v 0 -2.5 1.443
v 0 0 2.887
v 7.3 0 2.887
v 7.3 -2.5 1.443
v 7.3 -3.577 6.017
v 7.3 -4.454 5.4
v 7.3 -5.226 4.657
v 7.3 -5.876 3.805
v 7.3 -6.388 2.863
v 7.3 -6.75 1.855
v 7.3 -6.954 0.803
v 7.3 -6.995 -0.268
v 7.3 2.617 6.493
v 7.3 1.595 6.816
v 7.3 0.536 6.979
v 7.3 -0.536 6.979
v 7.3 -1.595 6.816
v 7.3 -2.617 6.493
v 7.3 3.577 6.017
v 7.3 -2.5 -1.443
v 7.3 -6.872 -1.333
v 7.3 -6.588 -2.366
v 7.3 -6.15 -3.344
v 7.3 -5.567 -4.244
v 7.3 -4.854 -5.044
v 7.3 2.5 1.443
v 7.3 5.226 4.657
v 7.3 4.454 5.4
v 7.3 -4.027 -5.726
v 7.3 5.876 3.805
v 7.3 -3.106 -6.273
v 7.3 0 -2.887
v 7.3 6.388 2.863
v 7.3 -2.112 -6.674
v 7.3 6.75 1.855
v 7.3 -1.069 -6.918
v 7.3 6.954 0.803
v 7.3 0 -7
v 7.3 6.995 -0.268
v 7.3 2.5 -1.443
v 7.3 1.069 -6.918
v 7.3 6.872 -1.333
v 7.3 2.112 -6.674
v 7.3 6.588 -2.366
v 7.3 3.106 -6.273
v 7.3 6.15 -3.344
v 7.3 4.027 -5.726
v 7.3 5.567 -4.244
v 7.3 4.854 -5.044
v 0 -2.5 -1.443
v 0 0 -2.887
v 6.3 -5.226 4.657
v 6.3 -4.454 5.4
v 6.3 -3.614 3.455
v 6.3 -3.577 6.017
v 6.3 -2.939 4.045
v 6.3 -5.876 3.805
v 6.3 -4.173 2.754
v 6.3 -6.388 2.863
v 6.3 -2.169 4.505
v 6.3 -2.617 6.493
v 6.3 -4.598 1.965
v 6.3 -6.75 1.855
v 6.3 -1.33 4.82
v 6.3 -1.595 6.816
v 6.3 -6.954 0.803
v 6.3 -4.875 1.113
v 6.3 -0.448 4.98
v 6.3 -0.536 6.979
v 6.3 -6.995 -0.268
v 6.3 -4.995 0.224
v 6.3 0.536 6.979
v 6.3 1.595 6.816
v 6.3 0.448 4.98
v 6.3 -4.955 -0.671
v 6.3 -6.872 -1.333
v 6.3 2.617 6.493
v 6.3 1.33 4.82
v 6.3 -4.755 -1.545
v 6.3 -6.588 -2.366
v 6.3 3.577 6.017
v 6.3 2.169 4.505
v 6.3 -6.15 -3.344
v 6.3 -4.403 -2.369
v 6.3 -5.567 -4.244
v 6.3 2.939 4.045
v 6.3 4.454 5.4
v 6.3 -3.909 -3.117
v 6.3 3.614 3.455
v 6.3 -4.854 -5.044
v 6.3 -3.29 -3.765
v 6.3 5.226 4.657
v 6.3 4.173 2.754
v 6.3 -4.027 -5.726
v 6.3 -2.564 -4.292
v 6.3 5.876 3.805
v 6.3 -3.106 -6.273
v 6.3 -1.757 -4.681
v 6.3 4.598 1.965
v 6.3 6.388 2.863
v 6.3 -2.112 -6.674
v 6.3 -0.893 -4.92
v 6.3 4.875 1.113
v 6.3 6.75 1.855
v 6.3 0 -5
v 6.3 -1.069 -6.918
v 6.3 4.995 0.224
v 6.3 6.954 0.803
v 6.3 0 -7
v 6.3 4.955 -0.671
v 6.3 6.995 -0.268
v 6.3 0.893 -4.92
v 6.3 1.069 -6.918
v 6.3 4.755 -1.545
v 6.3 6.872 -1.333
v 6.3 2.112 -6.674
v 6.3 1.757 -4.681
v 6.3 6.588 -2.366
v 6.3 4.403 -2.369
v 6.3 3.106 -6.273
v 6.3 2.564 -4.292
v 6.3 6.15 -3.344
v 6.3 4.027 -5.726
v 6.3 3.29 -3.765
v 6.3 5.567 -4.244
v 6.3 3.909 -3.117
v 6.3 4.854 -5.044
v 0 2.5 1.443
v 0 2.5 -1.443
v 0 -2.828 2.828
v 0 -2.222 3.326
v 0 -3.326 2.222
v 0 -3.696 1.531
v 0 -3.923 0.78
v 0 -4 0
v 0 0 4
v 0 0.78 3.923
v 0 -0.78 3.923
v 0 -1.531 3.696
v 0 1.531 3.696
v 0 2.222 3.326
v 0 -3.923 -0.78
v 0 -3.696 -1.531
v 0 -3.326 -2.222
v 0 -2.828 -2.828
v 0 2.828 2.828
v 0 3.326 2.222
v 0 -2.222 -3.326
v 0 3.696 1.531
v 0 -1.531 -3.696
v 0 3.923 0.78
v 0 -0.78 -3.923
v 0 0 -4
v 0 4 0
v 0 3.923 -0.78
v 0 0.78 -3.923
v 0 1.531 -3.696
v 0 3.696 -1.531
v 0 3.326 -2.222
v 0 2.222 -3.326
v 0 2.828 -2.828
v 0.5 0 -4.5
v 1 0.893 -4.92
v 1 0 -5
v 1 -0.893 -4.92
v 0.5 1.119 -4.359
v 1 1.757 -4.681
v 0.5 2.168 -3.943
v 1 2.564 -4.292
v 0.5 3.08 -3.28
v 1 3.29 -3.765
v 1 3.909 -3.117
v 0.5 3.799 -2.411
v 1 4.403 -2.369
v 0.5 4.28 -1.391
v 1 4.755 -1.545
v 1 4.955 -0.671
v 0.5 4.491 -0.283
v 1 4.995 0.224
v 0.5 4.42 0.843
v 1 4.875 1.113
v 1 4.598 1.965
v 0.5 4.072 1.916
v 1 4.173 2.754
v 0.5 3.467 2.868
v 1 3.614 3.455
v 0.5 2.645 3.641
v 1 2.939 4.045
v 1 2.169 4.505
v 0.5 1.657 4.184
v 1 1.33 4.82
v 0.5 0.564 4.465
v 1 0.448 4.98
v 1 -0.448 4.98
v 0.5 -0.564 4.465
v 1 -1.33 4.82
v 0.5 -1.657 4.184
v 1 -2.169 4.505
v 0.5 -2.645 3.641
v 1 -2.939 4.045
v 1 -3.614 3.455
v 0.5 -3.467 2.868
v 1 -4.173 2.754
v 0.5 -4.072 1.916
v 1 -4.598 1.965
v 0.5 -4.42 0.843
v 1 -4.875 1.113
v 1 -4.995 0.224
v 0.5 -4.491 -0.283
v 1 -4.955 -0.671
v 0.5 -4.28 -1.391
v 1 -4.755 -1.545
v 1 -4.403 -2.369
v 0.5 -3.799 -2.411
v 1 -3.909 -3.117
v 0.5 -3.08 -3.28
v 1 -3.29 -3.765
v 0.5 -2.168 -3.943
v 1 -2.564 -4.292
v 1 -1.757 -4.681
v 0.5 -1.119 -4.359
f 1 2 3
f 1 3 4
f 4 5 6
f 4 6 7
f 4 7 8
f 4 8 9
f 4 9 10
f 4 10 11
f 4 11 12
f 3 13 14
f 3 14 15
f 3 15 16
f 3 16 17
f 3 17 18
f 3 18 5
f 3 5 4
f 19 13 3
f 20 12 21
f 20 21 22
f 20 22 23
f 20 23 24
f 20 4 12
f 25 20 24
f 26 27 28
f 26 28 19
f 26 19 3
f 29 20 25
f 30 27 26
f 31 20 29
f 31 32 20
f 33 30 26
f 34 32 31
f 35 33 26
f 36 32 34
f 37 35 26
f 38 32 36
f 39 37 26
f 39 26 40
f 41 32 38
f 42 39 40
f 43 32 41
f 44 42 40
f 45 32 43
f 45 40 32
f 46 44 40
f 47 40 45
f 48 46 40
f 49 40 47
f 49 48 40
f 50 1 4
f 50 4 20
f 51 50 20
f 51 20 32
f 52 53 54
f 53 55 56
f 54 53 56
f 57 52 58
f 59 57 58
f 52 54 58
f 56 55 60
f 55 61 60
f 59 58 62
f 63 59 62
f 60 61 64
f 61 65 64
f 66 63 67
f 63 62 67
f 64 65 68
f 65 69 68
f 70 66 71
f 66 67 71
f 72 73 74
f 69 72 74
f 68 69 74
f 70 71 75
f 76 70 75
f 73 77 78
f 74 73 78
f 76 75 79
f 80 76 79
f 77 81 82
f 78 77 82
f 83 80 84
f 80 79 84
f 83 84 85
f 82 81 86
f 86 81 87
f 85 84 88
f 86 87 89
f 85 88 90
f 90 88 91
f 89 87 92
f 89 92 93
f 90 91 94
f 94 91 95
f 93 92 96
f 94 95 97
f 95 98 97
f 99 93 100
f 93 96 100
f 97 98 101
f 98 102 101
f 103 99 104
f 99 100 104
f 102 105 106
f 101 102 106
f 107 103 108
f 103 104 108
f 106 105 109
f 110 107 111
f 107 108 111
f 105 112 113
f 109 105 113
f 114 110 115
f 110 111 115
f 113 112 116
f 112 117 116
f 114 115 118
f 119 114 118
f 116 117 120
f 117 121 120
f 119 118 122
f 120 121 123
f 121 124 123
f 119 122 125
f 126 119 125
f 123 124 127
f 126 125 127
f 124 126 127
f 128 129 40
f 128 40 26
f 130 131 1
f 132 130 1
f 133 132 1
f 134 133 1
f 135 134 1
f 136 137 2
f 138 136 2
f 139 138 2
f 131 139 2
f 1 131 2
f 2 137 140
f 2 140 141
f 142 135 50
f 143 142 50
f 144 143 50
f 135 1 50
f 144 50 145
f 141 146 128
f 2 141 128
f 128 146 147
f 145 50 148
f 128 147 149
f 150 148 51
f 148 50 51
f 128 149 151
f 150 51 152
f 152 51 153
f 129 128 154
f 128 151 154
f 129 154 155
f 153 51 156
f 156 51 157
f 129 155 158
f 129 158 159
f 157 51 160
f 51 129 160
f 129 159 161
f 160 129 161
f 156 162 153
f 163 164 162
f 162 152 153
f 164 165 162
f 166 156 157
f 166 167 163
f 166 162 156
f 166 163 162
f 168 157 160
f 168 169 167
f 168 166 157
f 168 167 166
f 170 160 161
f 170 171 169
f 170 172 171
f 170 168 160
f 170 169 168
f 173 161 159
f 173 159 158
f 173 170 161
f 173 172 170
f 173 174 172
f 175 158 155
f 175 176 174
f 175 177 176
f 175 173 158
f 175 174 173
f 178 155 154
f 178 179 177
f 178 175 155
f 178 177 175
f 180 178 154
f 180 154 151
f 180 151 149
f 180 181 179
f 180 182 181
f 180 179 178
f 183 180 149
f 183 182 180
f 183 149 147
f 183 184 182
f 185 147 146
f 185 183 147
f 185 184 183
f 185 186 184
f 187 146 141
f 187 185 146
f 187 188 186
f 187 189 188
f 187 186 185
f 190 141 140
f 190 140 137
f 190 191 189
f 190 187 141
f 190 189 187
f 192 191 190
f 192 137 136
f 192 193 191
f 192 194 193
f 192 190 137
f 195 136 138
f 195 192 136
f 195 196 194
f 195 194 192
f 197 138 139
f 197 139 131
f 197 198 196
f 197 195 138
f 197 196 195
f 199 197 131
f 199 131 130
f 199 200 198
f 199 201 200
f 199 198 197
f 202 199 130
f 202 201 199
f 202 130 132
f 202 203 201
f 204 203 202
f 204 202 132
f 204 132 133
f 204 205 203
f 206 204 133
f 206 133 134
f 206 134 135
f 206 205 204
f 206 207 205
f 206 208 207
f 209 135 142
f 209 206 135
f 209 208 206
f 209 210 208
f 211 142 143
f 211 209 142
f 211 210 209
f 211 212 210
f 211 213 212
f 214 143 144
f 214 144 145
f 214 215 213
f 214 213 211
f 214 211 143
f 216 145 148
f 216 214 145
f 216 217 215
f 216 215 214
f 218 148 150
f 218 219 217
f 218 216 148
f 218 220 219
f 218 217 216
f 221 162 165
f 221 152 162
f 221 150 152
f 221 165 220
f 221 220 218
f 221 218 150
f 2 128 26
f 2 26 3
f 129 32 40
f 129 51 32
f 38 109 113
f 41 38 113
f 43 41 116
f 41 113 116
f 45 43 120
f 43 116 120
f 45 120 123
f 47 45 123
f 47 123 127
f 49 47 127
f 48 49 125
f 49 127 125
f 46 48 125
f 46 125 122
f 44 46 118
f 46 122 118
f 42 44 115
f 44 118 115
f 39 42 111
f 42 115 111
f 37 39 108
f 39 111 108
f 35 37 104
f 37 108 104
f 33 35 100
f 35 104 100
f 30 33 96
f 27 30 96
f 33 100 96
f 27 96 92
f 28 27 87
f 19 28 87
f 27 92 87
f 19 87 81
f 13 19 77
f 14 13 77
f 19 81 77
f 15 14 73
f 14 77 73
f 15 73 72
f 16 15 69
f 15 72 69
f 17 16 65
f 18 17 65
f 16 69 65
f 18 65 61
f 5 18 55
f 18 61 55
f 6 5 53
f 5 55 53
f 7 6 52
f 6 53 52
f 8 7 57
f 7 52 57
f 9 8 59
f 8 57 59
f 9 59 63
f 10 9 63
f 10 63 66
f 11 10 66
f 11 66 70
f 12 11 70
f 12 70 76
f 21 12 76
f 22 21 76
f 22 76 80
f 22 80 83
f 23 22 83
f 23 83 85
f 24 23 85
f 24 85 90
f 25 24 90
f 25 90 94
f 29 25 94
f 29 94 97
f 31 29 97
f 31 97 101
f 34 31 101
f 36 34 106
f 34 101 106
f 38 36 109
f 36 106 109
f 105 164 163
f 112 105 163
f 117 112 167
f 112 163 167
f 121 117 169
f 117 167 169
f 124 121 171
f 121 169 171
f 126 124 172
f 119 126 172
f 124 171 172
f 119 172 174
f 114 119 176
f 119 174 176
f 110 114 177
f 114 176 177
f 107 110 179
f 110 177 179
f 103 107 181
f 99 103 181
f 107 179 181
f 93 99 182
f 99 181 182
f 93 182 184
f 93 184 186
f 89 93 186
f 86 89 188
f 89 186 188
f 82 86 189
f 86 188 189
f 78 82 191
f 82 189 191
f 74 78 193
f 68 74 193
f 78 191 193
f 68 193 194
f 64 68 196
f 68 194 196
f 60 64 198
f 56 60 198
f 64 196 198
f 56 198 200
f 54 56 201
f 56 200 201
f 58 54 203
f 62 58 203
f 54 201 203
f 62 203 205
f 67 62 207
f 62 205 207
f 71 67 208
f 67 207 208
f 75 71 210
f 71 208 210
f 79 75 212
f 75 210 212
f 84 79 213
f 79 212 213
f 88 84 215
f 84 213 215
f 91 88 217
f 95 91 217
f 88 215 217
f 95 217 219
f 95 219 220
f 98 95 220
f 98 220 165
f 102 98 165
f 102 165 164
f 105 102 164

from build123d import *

# Parameters (mm, degrees)
SKETCH_1_R      = 5
EXTRUDE_1_DEPTH = 6.3
SKETCH_2_R      = 7
EXTRUDE_2_DEPTH = 1
CHAMFER_1_SIZE  = 1


with BuildPart() as part:
    # 草图1 → 凸台-拉伸1 (new body)
    with BuildSketch(Plane(origin=(0, 0, 0), x_dir=(0, 0, -1), z_dir=(1, 0, 0))):
        Circle(SKETCH_1_R)
        Polygon((2.886751346, 0), (1.443375673, 2.5), (-1.443375673, 2.5), (-2.886751346, 0), (-1.443375673, -2.5), (1.443375673, -2.5), align=None, mode=Mode.SUBTRACT)
    extrude(amount=EXTRUDE_1_DEPTH)

    # 草图2 → 凸台-拉伸2 (add)
    with BuildSketch(Plane(origin=(6.3, 0, 0), x_dir=(0, 0, -1), z_dir=(1, 0, 0))):
        Circle(SKETCH_2_R)
        Polygon((2.886751346, 0), (1.443375673, 2.5), (-1.443375673, 2.5), (-2.886751346, 0), (-1.443375673, -2.5), (1.443375673, -2.5), align=None, mode=Mode.SUBTRACT)
    extrude(amount=EXTRUDE_2_DEPTH)

    # 倒角1
    chamfer_1_edges = [part.edges().sort_by_distance(p)[0] for p in [
        (0, 0, 5),
    ]]
    chamfer(chamfer_1_edges, length=CHAMFER_1_SIZE)


solid = part.part
